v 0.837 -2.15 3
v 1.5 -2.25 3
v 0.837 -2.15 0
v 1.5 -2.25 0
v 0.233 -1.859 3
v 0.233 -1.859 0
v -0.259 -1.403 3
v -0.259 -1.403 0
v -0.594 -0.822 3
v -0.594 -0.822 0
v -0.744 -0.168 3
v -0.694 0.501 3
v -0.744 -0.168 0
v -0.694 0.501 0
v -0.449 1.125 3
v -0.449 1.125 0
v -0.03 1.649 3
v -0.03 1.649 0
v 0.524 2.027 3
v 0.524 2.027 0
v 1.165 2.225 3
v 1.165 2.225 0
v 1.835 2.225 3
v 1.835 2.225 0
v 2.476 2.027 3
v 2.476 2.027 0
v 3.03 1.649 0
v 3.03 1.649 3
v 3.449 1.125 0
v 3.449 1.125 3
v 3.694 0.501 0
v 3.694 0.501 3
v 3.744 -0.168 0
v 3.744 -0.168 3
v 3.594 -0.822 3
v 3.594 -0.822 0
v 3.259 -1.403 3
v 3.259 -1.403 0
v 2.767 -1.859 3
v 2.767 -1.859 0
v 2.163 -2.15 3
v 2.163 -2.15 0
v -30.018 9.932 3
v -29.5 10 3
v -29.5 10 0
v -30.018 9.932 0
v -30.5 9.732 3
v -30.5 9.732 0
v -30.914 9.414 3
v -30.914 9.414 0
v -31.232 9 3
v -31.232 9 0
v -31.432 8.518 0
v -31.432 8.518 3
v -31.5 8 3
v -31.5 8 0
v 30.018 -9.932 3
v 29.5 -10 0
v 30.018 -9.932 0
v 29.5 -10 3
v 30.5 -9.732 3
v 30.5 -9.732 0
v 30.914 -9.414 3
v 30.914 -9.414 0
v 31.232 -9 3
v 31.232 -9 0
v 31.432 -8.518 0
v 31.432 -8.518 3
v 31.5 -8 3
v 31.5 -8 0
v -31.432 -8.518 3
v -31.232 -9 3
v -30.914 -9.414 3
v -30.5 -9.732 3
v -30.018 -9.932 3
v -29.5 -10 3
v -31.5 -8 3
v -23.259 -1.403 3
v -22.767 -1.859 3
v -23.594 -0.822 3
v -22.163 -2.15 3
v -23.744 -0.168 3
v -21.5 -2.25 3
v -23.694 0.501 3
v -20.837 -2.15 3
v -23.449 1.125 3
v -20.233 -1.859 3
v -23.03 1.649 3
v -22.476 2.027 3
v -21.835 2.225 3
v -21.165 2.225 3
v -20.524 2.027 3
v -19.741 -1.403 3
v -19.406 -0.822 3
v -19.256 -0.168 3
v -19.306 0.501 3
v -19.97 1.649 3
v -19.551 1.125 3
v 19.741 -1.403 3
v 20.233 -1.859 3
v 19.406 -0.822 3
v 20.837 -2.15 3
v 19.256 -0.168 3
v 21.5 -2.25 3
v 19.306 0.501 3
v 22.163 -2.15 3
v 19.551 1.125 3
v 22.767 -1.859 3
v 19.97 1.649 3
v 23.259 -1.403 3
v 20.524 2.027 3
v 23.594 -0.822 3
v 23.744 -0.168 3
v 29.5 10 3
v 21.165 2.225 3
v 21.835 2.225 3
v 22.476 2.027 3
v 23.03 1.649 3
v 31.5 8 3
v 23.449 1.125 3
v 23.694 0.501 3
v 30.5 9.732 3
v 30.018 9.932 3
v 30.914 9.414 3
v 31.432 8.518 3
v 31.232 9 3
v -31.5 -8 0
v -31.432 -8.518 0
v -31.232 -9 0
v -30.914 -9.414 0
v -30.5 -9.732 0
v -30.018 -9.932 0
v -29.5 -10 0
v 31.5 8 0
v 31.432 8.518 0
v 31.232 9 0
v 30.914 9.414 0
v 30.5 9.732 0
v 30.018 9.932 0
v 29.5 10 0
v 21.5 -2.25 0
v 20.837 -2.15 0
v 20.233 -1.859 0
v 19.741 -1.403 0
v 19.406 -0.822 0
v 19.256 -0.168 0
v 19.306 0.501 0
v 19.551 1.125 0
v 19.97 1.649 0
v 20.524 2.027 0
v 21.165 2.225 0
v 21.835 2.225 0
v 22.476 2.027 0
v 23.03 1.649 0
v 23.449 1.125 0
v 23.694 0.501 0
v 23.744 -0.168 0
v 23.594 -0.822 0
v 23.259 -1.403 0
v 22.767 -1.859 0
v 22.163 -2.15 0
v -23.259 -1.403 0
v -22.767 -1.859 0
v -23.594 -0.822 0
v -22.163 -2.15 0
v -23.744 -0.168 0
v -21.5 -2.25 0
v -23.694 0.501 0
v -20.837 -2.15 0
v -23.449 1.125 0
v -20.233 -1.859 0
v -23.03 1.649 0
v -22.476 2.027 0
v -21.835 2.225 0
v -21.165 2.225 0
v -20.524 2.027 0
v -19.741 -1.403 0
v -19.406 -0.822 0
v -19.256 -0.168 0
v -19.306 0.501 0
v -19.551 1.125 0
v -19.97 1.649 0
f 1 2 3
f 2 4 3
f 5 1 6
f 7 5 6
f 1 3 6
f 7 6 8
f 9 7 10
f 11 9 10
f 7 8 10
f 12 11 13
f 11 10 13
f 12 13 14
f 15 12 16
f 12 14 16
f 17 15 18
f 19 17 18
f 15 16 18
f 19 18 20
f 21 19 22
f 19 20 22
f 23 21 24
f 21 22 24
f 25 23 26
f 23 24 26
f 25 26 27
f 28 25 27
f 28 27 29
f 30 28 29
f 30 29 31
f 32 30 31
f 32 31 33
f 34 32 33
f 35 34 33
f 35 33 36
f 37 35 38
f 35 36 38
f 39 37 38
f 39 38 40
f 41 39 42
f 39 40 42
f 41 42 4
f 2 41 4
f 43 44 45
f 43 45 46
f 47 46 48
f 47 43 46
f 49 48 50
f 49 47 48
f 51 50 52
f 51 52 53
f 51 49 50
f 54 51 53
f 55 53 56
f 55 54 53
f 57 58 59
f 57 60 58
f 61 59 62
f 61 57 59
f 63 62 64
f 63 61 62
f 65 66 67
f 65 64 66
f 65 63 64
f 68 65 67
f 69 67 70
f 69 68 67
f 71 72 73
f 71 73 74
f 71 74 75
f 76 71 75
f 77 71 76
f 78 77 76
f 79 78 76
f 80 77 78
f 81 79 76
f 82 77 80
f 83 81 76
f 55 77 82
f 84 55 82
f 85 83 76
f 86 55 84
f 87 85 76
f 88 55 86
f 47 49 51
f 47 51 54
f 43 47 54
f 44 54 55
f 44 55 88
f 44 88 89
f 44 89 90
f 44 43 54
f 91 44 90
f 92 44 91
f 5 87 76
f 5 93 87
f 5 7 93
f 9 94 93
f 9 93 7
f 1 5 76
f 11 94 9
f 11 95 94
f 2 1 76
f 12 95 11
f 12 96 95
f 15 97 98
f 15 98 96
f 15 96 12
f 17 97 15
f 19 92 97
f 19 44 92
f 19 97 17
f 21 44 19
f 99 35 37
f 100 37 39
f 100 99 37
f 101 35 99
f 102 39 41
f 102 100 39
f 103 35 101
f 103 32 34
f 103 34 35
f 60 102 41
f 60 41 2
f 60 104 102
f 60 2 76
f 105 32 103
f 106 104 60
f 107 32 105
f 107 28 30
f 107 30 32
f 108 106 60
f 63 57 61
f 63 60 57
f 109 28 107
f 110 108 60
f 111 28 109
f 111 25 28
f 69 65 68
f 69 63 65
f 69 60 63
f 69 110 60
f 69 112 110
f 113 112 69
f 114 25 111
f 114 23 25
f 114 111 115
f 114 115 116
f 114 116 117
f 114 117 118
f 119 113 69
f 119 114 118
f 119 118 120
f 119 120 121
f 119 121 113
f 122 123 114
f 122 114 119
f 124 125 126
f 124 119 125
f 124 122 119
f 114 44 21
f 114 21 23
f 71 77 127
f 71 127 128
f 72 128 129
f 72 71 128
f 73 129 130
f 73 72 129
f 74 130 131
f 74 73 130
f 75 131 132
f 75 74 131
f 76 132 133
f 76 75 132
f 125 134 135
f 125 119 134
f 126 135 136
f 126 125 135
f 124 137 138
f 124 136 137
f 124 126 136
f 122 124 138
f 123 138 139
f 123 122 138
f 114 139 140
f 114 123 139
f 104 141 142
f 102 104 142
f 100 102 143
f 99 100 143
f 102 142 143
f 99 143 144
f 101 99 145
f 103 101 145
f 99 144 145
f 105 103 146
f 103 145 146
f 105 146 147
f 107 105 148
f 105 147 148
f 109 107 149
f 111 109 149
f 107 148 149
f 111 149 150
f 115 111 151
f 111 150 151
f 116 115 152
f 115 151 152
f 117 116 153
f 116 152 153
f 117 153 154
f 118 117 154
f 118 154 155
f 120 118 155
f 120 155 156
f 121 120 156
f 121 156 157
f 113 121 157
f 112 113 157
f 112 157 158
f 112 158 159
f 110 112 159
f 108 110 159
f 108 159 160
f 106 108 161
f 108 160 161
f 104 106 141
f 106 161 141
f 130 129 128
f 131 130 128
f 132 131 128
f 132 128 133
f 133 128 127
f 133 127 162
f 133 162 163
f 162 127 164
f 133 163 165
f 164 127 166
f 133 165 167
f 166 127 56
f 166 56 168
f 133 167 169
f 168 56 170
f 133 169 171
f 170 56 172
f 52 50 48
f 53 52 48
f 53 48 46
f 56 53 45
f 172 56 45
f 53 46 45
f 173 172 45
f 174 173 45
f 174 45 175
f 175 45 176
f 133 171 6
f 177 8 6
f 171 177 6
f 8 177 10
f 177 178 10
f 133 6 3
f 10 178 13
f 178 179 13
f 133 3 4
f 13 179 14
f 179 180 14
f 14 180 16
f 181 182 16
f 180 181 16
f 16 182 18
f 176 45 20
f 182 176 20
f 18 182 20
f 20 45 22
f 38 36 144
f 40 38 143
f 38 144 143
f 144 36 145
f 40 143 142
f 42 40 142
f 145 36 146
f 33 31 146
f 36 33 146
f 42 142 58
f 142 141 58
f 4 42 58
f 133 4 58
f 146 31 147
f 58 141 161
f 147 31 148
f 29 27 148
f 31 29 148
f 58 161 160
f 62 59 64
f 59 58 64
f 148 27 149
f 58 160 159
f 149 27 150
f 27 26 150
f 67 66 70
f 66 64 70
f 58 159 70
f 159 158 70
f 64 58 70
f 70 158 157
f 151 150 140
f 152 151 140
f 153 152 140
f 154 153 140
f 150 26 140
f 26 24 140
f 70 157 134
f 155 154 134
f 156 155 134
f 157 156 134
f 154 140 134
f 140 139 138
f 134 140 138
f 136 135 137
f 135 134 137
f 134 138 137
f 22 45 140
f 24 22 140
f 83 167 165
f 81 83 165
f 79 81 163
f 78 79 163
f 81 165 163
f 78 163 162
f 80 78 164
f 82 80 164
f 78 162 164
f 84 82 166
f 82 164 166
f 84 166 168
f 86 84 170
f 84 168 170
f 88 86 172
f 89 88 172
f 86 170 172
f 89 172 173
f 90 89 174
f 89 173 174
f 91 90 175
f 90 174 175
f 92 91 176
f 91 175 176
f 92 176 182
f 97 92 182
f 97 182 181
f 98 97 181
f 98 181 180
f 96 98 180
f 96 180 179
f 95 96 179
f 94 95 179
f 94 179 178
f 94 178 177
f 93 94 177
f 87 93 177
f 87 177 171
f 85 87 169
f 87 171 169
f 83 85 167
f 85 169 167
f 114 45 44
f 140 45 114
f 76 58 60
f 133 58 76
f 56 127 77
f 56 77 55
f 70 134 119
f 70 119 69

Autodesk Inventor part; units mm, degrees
ref_plane "YZ Plane" through (0, 0, 0) normal (1, 0, 0) x (0, 1, 0)
ref_plane "XZ Plane" through (0, 0, 0) normal (0, 1, 0) x (-1, 0, 0)
ref_plane "XY Plane" through (0, 0, 0) normal (0, 0, 1) x (1, 0, 0)
sketch "スケッチ2" plane through (0, 0, 0) normal (0, 0, 1) x (1, 0, 0)
  line L0 (-31.5, 10) -> (31.5, 10)
  line L1 (31.5, 10) -> (31.5, -10)
  line L2 (31.5, -10) -> (-31.5, -10)
  line L3 (-31.5, -10) -> (-31.5, 10)
  line L4 (0, 14) -> (0, -14) construction
  line L5 (-44.1, 0) -> (44.1, 0) construction
  point P0 (0, 0)
  dimension "d1" = 63
  dimension "d2" = 20
  dimension "d3" = 10
  dimension "d4" = 31.5
extrude "押し出し1" add sketch "スケッチ2" along normal blind 3
sketch "スケッチ3" plane through (0, 0, 3) normal (0, 0, 1) x (1, 0, 0)
  line L0 (-31.5, -10) -> (31.5, -10) construction
  line L1 (31.5, -10) -> (31.5, 10) construction
  line L2 (31.5, 10) -> (-31.5, 10) construction
  line L3 (-31.5, 10) -> (-31.5, -10) construction
  line L4 (-44.1, 0) -> (44.1, 0) construction
  point P0 (0, 0)
  point P1 (-21.5, 0)
  point P2 (1.5, 0)
  point P3 (21.5, 0)
  dimension "d7" = 10
  dimension "d8" = 10
  dimension "d9" = 20
hole "穴1" at (-21.5, 0, 3) at (1.5, 0, 3) at (21.5, 0, 3) direction (0, 0, -1) diameter 4.5 end through all
fillet "フィレット1" radius 2 4 edges at (-31.5, 10, 1.5) (31.5, 10, 1.5) (31.5, -10, 1.5) (-31.5, -10, 1.5)
equation "\"d3\" = 0.5 * d2"
equation "\"d4\" = 0.5 * d1"
properties part number "rocker_bogie_mount"
